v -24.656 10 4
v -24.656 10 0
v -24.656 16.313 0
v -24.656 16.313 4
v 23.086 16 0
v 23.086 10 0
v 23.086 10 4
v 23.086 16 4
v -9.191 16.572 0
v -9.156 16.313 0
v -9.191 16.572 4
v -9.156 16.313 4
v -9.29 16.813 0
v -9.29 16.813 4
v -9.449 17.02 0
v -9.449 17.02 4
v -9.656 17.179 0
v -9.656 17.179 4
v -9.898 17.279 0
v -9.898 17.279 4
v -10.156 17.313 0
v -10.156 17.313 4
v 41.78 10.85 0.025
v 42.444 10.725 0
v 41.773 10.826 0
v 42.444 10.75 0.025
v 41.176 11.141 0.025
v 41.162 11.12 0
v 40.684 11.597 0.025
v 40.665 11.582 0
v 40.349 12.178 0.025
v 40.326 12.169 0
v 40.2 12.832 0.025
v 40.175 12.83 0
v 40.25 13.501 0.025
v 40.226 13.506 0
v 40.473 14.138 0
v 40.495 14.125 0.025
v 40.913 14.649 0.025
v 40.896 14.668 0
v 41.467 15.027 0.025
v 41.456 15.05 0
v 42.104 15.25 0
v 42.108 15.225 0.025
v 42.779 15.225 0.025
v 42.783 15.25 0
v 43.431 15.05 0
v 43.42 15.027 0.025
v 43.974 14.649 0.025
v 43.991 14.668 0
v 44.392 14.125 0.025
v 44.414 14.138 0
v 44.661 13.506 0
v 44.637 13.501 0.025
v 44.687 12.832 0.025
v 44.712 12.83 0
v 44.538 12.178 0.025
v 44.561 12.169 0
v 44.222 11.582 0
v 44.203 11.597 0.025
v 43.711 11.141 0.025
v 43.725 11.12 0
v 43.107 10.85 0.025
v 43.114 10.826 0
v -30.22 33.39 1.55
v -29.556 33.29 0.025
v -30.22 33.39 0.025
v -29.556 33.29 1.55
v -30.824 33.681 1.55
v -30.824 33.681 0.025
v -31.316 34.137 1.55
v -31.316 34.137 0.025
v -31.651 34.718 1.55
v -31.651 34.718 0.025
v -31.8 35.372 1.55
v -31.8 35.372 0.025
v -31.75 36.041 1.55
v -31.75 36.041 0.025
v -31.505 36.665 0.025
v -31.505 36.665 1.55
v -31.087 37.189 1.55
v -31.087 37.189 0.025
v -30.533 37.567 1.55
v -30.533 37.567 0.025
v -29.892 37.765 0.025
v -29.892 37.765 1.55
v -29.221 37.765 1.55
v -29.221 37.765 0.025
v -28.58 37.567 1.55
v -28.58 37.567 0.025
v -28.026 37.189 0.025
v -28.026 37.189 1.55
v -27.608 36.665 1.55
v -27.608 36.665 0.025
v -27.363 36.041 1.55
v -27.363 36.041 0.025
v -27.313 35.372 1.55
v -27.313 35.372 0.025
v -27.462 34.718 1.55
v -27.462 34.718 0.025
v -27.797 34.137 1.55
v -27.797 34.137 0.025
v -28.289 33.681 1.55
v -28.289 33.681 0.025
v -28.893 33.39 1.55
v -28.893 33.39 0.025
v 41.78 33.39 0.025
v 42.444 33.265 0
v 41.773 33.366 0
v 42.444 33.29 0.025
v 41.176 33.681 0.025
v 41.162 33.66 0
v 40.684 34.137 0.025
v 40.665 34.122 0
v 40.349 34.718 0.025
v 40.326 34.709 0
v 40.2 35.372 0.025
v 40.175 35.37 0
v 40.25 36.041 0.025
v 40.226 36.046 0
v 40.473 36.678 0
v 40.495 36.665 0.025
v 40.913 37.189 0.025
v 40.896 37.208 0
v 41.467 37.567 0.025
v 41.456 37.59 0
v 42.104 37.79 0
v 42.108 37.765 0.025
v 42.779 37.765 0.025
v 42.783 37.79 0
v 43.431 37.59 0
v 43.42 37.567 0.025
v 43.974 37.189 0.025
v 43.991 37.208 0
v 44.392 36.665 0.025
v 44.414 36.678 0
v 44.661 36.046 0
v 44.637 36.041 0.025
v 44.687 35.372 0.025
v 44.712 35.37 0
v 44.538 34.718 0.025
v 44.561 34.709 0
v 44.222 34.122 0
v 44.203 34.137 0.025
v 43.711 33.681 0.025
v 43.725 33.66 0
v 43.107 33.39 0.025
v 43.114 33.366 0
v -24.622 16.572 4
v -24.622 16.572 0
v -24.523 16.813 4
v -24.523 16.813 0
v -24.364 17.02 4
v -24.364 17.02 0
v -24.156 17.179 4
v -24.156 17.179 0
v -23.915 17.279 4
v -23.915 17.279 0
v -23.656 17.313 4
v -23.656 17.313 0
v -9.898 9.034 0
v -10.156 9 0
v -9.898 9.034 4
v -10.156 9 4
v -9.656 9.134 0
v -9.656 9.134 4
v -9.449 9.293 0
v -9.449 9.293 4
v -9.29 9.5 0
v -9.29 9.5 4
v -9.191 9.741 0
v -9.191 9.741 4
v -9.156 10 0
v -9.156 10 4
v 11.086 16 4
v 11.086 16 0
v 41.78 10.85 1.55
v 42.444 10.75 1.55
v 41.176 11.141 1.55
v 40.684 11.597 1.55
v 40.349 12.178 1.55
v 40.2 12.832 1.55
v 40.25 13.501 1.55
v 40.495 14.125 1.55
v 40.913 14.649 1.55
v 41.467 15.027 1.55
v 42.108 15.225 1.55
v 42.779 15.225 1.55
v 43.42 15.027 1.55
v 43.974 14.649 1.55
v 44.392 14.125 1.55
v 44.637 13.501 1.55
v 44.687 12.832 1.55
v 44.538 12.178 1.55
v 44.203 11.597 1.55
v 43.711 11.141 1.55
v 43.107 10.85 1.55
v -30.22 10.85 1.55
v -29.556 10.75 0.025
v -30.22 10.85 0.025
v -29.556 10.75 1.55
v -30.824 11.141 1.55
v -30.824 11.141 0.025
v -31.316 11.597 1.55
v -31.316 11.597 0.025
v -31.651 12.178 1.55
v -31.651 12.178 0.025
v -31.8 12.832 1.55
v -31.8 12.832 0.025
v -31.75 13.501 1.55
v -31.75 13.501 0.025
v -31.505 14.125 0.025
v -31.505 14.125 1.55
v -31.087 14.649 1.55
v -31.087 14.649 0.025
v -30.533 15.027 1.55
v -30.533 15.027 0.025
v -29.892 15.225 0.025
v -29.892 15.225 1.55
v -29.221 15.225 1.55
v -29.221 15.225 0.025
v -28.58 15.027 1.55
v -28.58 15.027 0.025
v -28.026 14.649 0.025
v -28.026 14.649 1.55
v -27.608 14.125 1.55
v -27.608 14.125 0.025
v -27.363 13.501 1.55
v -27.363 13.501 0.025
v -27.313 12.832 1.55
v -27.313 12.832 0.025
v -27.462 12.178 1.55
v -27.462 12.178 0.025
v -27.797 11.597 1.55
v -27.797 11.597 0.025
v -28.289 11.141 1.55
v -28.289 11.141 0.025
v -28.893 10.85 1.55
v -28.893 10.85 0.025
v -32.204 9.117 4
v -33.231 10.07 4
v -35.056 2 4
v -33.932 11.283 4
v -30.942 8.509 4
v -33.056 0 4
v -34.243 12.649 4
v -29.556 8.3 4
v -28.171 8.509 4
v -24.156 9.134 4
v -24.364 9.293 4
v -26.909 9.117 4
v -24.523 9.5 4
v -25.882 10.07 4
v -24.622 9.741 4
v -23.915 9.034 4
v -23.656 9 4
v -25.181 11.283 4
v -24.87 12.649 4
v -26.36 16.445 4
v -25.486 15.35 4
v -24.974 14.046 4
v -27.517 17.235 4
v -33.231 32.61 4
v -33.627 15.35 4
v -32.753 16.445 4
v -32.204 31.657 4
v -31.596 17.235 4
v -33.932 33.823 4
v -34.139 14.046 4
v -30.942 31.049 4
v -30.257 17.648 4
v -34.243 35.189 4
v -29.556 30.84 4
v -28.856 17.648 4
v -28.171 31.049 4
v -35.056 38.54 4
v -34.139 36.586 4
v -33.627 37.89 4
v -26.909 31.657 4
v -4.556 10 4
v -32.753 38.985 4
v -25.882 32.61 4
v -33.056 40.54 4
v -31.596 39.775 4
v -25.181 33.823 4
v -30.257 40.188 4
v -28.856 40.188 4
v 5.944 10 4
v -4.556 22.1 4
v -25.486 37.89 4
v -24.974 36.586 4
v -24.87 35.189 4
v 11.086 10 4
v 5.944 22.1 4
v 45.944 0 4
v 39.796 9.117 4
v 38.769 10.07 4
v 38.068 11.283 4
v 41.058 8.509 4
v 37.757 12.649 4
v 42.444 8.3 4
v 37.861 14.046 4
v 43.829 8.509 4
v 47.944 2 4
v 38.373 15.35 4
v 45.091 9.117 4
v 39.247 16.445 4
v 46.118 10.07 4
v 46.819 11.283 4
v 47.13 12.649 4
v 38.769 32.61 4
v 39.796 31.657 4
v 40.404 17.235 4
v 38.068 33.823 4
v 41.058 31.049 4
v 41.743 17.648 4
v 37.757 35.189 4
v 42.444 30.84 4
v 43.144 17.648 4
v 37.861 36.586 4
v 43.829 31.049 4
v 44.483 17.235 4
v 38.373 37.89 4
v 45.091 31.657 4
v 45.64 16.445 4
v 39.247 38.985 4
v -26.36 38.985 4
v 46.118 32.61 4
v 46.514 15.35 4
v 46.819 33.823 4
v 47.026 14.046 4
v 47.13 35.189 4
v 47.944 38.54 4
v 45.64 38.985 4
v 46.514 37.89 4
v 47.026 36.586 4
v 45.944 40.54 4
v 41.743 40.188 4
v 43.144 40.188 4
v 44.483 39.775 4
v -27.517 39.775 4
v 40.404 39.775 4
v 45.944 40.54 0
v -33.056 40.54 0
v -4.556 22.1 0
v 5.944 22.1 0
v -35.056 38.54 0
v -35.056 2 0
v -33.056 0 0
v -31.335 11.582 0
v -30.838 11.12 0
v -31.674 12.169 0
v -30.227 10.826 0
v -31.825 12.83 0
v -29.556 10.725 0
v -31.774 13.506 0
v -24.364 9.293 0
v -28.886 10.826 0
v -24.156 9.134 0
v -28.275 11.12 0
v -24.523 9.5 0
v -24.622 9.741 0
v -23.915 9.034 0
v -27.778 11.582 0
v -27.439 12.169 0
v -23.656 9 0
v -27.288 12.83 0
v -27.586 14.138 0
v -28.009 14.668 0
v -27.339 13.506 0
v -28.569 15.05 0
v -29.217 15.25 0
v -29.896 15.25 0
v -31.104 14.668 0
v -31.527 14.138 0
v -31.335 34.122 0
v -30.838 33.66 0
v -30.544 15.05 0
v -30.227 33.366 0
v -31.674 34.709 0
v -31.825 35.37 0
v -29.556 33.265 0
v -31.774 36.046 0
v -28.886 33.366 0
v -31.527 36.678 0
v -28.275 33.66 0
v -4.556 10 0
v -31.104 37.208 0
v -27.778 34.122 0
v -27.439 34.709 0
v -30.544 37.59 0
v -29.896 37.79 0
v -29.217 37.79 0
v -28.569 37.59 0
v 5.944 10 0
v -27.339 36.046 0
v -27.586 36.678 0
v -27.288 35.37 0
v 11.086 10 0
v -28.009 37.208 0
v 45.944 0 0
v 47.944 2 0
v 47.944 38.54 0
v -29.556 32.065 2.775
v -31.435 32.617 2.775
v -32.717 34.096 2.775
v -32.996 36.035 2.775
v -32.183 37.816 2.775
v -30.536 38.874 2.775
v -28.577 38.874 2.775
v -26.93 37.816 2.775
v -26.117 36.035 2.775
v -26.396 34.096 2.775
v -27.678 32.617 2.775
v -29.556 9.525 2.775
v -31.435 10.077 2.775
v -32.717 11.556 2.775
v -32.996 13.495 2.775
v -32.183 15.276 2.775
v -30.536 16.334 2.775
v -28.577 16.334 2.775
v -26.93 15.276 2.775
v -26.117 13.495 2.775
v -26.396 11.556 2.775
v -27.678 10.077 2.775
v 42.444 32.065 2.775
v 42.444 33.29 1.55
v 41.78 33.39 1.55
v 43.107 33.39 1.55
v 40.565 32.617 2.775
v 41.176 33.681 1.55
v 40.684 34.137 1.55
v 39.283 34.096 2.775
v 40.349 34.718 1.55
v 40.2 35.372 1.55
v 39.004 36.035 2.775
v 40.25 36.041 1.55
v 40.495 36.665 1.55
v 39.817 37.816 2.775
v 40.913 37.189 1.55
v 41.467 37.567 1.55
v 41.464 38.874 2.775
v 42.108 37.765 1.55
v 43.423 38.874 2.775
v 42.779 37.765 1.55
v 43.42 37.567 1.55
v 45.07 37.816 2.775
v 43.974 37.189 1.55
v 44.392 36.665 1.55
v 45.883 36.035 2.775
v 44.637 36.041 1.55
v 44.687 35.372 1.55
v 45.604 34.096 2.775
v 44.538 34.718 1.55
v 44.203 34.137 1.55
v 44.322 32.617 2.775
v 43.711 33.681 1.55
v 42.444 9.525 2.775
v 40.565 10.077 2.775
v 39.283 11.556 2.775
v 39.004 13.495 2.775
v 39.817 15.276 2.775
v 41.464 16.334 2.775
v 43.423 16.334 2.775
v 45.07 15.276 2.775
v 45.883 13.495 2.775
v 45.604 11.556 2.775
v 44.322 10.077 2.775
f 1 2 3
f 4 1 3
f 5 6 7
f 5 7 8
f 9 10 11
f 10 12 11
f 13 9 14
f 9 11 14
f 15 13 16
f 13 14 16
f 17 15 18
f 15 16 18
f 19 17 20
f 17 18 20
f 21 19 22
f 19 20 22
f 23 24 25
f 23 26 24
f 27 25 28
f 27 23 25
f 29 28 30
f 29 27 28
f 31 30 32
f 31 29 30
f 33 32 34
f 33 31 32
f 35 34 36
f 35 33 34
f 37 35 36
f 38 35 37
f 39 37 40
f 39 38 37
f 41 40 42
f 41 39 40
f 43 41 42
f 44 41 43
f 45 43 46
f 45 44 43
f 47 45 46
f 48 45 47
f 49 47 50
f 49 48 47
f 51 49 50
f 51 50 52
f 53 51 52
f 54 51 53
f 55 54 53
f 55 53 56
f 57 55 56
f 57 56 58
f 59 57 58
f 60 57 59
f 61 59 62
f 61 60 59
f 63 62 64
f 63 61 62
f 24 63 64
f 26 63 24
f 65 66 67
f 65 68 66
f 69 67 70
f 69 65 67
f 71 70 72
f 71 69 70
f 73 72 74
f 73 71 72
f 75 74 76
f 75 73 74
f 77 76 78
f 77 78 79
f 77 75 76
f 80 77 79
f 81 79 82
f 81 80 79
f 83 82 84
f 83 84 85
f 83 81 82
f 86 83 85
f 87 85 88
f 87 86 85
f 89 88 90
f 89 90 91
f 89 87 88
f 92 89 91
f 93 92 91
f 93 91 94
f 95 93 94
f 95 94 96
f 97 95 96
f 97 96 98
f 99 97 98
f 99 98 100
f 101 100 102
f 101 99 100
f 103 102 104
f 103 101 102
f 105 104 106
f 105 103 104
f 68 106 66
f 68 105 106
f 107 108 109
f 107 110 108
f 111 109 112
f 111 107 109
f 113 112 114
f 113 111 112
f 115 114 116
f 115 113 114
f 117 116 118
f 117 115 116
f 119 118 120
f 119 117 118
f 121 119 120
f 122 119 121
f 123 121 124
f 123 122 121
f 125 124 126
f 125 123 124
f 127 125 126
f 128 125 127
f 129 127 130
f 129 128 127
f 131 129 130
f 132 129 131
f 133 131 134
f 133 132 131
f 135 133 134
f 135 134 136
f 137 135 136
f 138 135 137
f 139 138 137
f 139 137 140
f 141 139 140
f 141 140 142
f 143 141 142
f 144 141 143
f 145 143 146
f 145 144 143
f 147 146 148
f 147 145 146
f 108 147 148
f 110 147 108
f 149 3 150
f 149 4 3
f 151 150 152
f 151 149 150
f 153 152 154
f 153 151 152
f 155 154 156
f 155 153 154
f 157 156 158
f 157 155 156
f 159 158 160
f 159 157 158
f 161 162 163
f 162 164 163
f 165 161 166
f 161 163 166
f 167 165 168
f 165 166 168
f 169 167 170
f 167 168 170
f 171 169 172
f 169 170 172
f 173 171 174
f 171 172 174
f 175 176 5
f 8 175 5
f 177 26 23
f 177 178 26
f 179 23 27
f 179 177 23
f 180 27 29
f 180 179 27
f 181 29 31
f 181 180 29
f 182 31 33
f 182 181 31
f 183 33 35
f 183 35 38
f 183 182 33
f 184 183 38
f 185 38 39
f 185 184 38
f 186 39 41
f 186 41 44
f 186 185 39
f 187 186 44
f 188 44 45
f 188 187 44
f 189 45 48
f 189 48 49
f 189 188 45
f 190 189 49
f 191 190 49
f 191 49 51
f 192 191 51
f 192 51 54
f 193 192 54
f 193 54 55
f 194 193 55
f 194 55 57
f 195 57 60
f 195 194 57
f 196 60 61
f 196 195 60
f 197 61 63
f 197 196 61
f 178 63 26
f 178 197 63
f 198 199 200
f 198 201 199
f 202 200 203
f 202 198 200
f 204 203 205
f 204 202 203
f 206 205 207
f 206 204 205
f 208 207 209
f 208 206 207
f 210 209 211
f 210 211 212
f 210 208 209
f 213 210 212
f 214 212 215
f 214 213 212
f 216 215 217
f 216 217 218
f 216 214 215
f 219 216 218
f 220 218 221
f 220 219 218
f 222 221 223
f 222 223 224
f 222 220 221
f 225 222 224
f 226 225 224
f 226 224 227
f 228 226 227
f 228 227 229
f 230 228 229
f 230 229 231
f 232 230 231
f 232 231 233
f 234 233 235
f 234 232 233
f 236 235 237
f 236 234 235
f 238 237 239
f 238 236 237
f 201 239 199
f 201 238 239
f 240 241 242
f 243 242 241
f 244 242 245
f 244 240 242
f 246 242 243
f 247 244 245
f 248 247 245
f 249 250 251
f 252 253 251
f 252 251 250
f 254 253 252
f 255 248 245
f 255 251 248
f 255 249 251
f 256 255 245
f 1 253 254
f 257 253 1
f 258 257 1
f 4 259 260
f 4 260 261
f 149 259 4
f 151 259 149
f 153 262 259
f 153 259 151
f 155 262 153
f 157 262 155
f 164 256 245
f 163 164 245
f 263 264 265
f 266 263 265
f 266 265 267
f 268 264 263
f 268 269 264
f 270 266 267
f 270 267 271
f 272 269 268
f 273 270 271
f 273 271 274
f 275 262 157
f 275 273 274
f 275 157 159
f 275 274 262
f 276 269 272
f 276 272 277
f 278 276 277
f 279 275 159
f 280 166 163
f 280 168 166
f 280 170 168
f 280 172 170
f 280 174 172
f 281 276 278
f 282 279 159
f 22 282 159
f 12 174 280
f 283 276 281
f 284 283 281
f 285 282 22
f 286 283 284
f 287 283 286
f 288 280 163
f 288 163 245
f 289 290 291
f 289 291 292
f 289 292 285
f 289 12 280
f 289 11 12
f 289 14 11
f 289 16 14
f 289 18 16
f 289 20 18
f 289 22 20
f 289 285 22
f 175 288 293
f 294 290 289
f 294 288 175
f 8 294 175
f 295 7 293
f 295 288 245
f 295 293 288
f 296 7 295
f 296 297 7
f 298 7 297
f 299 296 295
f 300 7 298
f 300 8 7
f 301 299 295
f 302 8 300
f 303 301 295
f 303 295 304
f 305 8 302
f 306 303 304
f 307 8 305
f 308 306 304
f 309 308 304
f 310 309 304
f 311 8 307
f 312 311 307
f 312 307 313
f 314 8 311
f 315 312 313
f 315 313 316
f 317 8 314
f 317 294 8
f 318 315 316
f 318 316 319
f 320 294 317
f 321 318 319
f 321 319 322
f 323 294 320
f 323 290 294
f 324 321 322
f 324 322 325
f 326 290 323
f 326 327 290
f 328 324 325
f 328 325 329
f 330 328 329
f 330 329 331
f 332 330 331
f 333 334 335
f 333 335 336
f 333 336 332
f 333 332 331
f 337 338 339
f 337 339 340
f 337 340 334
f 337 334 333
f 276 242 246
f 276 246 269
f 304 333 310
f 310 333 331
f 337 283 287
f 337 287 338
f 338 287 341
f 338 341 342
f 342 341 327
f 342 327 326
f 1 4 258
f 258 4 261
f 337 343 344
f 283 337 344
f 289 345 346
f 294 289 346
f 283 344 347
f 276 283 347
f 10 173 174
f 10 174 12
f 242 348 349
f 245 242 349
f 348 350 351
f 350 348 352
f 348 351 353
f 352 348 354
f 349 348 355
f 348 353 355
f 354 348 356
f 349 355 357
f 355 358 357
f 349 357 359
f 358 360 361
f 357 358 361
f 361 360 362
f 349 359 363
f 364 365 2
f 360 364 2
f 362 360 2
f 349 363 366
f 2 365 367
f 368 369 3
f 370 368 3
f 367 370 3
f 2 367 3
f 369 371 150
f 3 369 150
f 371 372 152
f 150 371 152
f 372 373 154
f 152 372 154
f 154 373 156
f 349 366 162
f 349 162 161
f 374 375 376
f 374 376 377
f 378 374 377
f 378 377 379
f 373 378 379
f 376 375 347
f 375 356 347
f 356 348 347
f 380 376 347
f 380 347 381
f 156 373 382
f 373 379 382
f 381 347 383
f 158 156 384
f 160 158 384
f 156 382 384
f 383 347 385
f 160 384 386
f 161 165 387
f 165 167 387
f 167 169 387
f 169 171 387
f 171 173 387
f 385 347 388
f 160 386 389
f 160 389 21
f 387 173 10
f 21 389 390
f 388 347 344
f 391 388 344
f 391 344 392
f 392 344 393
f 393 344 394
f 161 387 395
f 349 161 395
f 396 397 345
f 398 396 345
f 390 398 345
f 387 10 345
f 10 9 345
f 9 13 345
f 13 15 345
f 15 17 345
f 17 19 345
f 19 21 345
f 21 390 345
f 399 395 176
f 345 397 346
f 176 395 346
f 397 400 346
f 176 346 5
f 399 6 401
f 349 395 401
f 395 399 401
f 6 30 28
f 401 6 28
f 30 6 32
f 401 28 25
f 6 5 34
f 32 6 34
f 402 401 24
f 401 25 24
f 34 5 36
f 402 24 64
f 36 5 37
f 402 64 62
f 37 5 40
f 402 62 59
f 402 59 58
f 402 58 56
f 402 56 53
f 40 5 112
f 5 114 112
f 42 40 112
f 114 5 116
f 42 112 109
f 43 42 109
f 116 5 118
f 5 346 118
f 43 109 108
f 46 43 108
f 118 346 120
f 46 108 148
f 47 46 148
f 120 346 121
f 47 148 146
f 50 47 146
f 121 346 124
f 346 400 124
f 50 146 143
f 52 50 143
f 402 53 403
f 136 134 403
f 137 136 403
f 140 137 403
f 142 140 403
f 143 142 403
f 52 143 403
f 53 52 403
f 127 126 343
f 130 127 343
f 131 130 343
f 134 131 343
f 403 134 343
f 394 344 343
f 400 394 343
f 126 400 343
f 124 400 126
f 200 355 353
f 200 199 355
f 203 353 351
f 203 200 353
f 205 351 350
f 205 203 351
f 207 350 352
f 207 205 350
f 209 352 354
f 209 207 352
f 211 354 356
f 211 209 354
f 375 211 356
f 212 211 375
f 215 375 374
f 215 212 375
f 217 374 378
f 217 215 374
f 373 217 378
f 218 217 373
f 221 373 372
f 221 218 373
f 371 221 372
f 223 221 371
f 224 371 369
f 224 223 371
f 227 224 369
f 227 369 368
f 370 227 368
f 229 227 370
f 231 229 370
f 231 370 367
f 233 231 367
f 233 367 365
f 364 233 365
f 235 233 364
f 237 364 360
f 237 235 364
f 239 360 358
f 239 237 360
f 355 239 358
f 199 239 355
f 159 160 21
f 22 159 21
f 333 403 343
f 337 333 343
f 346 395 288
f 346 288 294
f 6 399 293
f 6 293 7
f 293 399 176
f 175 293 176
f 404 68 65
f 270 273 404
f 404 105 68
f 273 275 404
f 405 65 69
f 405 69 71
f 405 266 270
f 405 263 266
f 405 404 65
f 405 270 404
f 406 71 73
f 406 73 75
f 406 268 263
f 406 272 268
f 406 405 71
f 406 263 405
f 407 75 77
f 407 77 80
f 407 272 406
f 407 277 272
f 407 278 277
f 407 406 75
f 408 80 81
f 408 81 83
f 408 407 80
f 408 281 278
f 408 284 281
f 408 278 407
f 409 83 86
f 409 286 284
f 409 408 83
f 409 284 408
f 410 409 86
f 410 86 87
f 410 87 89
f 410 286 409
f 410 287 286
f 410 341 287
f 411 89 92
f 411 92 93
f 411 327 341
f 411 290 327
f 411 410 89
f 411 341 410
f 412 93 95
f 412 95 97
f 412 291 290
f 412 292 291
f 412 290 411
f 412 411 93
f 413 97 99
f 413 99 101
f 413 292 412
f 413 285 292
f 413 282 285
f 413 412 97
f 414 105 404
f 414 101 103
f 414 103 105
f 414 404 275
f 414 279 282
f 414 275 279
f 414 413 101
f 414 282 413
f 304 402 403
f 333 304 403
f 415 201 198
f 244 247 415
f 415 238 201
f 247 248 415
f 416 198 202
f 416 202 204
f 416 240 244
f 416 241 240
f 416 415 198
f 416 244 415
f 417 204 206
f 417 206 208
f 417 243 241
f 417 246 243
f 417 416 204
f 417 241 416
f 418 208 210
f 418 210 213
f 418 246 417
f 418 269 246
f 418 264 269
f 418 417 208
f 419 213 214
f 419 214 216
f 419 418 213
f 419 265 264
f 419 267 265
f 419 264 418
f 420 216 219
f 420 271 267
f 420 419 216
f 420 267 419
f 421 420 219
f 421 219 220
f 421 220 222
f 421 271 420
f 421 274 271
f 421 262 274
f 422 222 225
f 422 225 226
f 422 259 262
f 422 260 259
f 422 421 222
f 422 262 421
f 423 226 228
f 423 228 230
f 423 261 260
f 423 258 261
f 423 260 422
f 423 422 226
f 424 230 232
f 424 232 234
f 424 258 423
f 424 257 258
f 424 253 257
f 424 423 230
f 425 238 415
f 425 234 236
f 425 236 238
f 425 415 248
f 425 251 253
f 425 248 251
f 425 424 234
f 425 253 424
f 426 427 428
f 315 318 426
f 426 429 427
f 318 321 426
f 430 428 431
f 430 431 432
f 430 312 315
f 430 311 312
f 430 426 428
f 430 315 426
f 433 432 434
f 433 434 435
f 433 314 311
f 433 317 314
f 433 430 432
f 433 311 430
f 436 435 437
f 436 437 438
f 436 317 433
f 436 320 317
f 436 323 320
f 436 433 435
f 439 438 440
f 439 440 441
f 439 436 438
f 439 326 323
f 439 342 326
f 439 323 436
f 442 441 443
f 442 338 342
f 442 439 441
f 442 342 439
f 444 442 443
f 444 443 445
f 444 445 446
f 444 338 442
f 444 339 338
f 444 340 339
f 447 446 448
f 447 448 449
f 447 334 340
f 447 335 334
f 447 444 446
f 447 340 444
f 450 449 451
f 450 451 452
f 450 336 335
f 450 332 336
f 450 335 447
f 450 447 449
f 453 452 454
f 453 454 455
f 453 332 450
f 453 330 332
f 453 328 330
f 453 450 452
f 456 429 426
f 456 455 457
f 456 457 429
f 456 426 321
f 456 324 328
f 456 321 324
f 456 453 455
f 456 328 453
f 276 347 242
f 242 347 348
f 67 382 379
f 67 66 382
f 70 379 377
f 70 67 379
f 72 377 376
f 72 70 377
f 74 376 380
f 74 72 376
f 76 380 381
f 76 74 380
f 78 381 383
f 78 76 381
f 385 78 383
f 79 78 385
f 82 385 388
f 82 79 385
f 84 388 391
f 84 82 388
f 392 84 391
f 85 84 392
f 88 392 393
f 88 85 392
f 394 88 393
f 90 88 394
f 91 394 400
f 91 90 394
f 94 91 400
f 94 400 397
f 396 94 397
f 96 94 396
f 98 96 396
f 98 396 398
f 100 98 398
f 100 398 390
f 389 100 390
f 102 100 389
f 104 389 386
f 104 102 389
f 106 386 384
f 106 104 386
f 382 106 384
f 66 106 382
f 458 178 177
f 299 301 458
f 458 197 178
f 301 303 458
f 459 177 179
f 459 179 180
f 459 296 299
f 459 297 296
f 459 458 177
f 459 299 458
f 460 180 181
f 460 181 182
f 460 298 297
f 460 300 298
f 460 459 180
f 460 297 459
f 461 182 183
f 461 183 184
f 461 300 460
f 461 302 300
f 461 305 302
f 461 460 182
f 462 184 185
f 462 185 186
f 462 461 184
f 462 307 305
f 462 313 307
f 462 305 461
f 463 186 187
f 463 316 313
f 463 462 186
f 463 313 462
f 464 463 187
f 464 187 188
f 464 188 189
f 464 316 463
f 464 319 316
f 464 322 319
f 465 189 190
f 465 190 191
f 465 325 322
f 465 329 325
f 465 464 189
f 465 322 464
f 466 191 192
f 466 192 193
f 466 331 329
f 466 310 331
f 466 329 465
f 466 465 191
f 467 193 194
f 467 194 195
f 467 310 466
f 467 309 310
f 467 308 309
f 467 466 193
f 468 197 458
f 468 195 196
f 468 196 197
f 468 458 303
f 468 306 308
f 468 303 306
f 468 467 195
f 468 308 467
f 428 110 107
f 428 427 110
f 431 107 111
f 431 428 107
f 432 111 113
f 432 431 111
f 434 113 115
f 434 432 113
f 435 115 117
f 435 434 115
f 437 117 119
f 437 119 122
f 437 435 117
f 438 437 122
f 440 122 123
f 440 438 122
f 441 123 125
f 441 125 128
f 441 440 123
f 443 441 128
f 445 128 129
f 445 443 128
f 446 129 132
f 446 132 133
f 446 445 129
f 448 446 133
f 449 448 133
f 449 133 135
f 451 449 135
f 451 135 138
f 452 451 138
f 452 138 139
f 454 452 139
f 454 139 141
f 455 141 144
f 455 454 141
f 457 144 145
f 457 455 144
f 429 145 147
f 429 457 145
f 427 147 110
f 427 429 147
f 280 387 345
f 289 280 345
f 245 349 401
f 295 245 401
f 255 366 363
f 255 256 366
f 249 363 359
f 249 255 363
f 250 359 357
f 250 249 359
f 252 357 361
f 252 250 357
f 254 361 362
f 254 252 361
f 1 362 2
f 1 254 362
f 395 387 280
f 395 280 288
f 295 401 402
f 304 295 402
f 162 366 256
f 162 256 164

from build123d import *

# Parameters (mm, degrees)
ESQUISSE1_W                                 = 15.5
ESQUISSE1_H                                 = 8.312963114
ESQUISSE1_W_2                               = 10.5
ESQUISSE1_H_2                               = 12.1
ESQUISSE1_W_3                               = 12
ESQUISSE1_H_3                               = 6
BOSS_EXTRU_1_DEPTH                          = 4
FRAISAGE_POUR_VIS_T_TE_FRAIS_E_M41_AT_COUNT = 2
FRAISAGE_POUR_VIS_T_TE_FRAIS_E_M41_AT_PITCH = 22.54
FRAISAGE_POUR_VIS_T_TE_FRAIS_E_M41_2_COUNT  = 2
FRAISAGE_POUR_VIS_T_TE_FRAIS_E_M41_2_PITCH  = 75.445686424
FRAISAGE_POUR_VIS_T_TE_FRAIS_E_M41_3_COUNT  = 2
FRAISAGE_POUR_VIS_T_TE_FRAIS_E_M41_3_PITCH  = 72
CONG_1_R                                    = 1


with BuildPart() as part:
    # Esquisse1 → Boss.-Extru.1 (new body)
    with BuildSketch(Plane.XY):
        Polygon((-35.056497175, 38.54), (-35.056497175, 2), (-33.056497175, 0), (45.943502825, 0), (47.943502825, 2), (47.943502825, 38.54), (45.943502825, 40.54), (-33.056497175, 40.54), align=None)
        with Locations((-16.906497175, 13.156481557)):
            Rectangle(ESQUISSE1_W, ESQUISSE1_H, mode=Mode.SUBTRACT)
        with Locations((0.693502825, 16.05)):
            Rectangle(ESQUISSE1_W_2, ESQUISSE1_H_2, mode=Mode.SUBTRACT)
        with Locations((17.086336796, 13)):
            Rectangle(ESQUISSE1_W_3, ESQUISSE1_H_3, mode=Mode.SUBTRACT)
    extrude(amount=BOSS_EXTRU_1_DEPTH)

    # Esquisse4 → Fraisage pour vis à tête fraisée M41 (revolve, cut)
    with BuildSketch(Plane(origin=(-29.556497175, 35.54, 4), x_dir=(0, -1, 0), z_dir=(1, 0, 0))):
        Polygon((0, 0), (0, 4), (2.275, 4), (2.25, 3.975), (2.25, 2.45), (4.7, 0), align=None)
    fraisage_pour_vis_t_te_frais_e_m41 = revolve(axis=Axis((-29.556497175, 35.54, 10.35), (0, 0, -1)), mode=Mode.SUBTRACT)

    # Fraisage pour vis à tête fraisée M41 at: Fraisage pour vis à tête fraisée M41 ×2
    with Locations(*[(0, -i * FRAISAGE_POUR_VIS_T_TE_FRAIS_E_M41_AT_PITCH, 0) for i in range(1, FRAISAGE_POUR_VIS_T_TE_FRAIS_E_M41_AT_COUNT)]):
        add(fraisage_pour_vis_t_te_frais_e_m41, mode=Mode.SUBTRACT)

    # Fraisage pour vis _ t_te frais_e M41 2: Fraisage pour vis à tête fraisée M41 ×2
    with Locations(*[Vector(0.9543289141183242, -0.29875796839204205, 0) * (i * FRAISAGE_POUR_VIS_T_TE_FRAIS_E_M41_2_PITCH) for i in range(1, FRAISAGE_POUR_VIS_T_TE_FRAIS_E_M41_2_COUNT)]):
        add(fraisage_pour_vis_t_te_frais_e_m41, mode=Mode.SUBTRACT)

    # Fraisage pour vis _ t_te frais_e M41 3: Fraisage pour vis à tête fraisée M41 ×2
    with Locations(*[(i * FRAISAGE_POUR_VIS_T_TE_FRAIS_E_M41_3_PITCH, 0, 0) for i in range(1, FRAISAGE_POUR_VIS_T_TE_FRAIS_E_M41_3_COUNT)]):
        add(fraisage_pour_vis_t_te_frais_e_m41, mode=Mode.SUBTRACT)

    # Congé1
    cong_1_edges = [part.edges().sort_by_distance(p)[0] for p in [
        (-24.656497175, 17.312963114, 2),
        (-24.656497175, 9, 2),
        (-9.156497175, 9, 2),
        (-9.156497175, 17.312963114, 2),
    ]]
    fillet(cong_1_edges, radius=CONG_1_R)


solid = part.part
